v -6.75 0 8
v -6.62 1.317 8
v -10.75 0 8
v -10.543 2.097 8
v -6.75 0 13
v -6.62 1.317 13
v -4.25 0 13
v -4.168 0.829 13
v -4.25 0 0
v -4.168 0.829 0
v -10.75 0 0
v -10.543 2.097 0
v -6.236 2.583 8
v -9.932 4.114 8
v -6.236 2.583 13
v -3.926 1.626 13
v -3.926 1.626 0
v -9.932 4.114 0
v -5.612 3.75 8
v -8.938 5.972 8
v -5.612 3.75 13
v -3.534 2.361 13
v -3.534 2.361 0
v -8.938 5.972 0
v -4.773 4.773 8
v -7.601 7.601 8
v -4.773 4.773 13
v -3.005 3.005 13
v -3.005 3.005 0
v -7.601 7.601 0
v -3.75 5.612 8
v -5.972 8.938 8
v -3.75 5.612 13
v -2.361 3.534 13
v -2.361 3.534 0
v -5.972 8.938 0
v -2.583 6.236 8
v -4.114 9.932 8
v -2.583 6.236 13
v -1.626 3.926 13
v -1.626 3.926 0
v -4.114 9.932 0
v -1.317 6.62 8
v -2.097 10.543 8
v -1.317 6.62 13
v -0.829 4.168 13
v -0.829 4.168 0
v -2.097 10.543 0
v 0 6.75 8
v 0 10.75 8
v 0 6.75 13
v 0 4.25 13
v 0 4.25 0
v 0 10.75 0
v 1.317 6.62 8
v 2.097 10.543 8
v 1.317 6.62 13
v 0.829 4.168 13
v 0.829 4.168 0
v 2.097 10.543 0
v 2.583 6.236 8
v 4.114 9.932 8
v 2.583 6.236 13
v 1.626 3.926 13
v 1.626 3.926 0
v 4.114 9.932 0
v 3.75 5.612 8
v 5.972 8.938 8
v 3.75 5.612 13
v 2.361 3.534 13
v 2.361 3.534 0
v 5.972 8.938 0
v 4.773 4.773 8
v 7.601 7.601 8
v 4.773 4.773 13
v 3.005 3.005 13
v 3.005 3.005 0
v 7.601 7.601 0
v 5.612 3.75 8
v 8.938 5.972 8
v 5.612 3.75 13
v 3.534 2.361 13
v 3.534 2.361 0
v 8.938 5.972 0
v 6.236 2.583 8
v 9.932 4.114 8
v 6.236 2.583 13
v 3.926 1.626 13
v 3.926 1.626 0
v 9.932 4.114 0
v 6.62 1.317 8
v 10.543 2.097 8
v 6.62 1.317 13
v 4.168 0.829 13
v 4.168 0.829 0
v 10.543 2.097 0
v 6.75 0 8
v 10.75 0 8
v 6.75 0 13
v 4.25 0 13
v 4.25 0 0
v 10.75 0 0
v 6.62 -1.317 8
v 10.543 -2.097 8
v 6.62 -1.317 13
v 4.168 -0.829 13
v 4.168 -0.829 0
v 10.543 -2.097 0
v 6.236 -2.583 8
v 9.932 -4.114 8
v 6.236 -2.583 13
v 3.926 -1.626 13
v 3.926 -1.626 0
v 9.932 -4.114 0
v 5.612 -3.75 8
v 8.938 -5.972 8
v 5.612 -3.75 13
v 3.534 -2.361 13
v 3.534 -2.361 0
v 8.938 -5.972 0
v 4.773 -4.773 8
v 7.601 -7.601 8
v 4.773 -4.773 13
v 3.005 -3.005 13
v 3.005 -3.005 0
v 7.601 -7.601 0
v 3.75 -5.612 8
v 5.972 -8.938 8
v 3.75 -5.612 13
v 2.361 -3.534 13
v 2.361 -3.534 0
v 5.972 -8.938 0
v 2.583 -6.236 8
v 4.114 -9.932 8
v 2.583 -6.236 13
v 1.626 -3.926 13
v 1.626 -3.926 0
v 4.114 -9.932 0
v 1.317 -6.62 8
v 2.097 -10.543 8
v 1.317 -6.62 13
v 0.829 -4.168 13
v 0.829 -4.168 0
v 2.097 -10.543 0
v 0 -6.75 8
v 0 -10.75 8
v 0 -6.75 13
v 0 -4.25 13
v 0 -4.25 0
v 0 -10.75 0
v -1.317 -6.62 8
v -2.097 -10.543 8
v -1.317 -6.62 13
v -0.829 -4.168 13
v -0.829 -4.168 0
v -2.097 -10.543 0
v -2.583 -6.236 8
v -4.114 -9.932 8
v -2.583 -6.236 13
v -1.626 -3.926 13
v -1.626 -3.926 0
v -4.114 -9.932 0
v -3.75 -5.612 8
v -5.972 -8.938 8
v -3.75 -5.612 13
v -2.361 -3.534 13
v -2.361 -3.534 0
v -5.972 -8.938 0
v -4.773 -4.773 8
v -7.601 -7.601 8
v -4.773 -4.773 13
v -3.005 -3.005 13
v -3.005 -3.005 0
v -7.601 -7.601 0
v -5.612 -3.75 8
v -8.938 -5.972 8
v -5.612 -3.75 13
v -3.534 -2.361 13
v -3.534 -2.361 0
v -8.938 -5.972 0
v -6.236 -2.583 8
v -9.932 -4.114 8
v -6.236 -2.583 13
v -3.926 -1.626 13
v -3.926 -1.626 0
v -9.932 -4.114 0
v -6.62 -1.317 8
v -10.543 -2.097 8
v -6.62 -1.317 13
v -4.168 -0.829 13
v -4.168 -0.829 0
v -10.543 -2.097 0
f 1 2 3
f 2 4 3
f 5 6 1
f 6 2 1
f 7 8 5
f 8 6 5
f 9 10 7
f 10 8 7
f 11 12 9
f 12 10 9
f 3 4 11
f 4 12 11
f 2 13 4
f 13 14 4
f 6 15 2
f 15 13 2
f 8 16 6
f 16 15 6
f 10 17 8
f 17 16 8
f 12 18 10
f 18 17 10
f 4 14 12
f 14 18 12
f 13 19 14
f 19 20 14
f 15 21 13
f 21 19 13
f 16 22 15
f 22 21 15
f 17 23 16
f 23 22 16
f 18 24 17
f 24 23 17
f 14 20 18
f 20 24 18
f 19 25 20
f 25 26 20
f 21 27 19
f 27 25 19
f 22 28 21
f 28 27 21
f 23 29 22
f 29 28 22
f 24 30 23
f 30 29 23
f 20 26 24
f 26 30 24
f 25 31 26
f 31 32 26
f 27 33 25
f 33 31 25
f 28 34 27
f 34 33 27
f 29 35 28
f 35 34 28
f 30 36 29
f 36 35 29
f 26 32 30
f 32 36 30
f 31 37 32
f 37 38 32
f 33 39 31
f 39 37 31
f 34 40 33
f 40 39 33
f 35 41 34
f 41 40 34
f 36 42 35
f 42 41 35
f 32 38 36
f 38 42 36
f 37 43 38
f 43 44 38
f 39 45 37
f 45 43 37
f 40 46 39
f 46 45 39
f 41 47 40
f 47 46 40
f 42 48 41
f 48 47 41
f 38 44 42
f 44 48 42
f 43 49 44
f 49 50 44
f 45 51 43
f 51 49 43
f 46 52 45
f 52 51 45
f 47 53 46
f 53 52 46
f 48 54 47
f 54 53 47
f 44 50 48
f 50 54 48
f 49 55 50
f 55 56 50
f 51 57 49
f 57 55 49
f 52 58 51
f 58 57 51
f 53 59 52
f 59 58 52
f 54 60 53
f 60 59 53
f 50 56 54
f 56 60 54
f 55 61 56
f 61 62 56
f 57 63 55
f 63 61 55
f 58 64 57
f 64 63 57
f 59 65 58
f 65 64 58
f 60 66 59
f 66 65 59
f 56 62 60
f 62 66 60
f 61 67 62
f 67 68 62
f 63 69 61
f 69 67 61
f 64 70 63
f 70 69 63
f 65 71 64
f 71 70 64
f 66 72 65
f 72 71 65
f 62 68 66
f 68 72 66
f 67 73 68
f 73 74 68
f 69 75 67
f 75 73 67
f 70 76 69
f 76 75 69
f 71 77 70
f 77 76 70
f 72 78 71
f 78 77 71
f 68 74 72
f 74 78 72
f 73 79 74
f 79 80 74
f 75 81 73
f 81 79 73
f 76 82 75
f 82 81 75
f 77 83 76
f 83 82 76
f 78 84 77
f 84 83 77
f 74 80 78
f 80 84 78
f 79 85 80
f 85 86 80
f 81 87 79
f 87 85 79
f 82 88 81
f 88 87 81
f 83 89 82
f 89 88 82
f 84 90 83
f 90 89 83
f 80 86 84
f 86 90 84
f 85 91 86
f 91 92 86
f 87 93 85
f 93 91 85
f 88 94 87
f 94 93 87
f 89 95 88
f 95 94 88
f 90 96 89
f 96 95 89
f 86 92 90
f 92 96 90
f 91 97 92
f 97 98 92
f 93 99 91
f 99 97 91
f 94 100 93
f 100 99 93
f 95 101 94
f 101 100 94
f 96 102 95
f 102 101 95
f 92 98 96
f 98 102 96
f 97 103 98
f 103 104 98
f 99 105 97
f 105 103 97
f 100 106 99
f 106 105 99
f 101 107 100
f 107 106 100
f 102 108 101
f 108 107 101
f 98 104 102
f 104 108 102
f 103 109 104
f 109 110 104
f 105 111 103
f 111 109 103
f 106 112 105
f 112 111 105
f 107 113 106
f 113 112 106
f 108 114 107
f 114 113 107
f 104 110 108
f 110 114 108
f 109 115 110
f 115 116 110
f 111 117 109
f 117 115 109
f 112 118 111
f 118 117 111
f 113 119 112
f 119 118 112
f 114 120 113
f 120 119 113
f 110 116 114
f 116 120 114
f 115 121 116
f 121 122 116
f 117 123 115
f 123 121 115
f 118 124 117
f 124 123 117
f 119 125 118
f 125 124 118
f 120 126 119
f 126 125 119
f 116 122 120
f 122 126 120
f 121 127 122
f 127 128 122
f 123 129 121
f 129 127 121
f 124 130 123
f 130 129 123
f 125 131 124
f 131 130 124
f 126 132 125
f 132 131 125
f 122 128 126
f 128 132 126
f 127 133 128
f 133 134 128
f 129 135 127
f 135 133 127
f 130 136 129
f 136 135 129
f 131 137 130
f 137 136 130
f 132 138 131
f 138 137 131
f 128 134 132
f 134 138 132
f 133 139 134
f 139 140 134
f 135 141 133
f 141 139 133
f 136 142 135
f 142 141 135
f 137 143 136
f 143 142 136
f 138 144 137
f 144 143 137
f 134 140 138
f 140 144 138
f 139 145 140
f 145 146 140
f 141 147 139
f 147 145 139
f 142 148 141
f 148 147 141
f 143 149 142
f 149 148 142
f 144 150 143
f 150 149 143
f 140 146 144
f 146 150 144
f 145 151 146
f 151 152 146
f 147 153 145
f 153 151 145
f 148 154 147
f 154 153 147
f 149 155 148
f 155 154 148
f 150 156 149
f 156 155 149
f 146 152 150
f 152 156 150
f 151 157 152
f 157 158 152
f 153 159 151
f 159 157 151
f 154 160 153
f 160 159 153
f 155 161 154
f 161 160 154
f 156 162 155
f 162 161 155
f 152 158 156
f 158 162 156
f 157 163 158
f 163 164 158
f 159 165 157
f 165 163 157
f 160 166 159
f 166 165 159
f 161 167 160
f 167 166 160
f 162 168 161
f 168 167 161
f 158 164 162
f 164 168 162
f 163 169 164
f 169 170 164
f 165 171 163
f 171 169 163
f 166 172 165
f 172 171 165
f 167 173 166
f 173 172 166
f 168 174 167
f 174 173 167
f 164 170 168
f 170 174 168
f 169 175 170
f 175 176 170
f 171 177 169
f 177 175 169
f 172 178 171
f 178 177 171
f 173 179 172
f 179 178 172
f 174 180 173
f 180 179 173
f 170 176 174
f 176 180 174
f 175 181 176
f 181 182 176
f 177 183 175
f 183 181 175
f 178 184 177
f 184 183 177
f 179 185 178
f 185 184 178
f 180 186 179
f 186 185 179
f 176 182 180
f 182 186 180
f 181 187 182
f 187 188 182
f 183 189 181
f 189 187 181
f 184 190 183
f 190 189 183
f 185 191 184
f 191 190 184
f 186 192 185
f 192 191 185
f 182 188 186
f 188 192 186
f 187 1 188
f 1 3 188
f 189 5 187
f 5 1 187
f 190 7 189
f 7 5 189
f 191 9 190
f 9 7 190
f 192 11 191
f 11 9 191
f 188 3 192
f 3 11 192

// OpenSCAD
$fn = 32;

// ----------------------------------------------------------------------
// Form washer: stepped_c washer, 21.5 mm outside, 8.5 mm bore
// ----------------------------------------------------------------------

// --- parameters (mm) ---
revolve_angle = 360;      // full turn around the Z axis
profile_points = 6;       // points of the closed outline

profile = [[4.25, 0], [10.75, 0], [10.75, 8], [6.75, 8], [6.75, 13], [4.25, 13]];  // single closed polygon, 6 points, counter clockwise

// --- the one profile operation ---
rotate_extrude(angle = revolve_angle) polygon(points = profile);
